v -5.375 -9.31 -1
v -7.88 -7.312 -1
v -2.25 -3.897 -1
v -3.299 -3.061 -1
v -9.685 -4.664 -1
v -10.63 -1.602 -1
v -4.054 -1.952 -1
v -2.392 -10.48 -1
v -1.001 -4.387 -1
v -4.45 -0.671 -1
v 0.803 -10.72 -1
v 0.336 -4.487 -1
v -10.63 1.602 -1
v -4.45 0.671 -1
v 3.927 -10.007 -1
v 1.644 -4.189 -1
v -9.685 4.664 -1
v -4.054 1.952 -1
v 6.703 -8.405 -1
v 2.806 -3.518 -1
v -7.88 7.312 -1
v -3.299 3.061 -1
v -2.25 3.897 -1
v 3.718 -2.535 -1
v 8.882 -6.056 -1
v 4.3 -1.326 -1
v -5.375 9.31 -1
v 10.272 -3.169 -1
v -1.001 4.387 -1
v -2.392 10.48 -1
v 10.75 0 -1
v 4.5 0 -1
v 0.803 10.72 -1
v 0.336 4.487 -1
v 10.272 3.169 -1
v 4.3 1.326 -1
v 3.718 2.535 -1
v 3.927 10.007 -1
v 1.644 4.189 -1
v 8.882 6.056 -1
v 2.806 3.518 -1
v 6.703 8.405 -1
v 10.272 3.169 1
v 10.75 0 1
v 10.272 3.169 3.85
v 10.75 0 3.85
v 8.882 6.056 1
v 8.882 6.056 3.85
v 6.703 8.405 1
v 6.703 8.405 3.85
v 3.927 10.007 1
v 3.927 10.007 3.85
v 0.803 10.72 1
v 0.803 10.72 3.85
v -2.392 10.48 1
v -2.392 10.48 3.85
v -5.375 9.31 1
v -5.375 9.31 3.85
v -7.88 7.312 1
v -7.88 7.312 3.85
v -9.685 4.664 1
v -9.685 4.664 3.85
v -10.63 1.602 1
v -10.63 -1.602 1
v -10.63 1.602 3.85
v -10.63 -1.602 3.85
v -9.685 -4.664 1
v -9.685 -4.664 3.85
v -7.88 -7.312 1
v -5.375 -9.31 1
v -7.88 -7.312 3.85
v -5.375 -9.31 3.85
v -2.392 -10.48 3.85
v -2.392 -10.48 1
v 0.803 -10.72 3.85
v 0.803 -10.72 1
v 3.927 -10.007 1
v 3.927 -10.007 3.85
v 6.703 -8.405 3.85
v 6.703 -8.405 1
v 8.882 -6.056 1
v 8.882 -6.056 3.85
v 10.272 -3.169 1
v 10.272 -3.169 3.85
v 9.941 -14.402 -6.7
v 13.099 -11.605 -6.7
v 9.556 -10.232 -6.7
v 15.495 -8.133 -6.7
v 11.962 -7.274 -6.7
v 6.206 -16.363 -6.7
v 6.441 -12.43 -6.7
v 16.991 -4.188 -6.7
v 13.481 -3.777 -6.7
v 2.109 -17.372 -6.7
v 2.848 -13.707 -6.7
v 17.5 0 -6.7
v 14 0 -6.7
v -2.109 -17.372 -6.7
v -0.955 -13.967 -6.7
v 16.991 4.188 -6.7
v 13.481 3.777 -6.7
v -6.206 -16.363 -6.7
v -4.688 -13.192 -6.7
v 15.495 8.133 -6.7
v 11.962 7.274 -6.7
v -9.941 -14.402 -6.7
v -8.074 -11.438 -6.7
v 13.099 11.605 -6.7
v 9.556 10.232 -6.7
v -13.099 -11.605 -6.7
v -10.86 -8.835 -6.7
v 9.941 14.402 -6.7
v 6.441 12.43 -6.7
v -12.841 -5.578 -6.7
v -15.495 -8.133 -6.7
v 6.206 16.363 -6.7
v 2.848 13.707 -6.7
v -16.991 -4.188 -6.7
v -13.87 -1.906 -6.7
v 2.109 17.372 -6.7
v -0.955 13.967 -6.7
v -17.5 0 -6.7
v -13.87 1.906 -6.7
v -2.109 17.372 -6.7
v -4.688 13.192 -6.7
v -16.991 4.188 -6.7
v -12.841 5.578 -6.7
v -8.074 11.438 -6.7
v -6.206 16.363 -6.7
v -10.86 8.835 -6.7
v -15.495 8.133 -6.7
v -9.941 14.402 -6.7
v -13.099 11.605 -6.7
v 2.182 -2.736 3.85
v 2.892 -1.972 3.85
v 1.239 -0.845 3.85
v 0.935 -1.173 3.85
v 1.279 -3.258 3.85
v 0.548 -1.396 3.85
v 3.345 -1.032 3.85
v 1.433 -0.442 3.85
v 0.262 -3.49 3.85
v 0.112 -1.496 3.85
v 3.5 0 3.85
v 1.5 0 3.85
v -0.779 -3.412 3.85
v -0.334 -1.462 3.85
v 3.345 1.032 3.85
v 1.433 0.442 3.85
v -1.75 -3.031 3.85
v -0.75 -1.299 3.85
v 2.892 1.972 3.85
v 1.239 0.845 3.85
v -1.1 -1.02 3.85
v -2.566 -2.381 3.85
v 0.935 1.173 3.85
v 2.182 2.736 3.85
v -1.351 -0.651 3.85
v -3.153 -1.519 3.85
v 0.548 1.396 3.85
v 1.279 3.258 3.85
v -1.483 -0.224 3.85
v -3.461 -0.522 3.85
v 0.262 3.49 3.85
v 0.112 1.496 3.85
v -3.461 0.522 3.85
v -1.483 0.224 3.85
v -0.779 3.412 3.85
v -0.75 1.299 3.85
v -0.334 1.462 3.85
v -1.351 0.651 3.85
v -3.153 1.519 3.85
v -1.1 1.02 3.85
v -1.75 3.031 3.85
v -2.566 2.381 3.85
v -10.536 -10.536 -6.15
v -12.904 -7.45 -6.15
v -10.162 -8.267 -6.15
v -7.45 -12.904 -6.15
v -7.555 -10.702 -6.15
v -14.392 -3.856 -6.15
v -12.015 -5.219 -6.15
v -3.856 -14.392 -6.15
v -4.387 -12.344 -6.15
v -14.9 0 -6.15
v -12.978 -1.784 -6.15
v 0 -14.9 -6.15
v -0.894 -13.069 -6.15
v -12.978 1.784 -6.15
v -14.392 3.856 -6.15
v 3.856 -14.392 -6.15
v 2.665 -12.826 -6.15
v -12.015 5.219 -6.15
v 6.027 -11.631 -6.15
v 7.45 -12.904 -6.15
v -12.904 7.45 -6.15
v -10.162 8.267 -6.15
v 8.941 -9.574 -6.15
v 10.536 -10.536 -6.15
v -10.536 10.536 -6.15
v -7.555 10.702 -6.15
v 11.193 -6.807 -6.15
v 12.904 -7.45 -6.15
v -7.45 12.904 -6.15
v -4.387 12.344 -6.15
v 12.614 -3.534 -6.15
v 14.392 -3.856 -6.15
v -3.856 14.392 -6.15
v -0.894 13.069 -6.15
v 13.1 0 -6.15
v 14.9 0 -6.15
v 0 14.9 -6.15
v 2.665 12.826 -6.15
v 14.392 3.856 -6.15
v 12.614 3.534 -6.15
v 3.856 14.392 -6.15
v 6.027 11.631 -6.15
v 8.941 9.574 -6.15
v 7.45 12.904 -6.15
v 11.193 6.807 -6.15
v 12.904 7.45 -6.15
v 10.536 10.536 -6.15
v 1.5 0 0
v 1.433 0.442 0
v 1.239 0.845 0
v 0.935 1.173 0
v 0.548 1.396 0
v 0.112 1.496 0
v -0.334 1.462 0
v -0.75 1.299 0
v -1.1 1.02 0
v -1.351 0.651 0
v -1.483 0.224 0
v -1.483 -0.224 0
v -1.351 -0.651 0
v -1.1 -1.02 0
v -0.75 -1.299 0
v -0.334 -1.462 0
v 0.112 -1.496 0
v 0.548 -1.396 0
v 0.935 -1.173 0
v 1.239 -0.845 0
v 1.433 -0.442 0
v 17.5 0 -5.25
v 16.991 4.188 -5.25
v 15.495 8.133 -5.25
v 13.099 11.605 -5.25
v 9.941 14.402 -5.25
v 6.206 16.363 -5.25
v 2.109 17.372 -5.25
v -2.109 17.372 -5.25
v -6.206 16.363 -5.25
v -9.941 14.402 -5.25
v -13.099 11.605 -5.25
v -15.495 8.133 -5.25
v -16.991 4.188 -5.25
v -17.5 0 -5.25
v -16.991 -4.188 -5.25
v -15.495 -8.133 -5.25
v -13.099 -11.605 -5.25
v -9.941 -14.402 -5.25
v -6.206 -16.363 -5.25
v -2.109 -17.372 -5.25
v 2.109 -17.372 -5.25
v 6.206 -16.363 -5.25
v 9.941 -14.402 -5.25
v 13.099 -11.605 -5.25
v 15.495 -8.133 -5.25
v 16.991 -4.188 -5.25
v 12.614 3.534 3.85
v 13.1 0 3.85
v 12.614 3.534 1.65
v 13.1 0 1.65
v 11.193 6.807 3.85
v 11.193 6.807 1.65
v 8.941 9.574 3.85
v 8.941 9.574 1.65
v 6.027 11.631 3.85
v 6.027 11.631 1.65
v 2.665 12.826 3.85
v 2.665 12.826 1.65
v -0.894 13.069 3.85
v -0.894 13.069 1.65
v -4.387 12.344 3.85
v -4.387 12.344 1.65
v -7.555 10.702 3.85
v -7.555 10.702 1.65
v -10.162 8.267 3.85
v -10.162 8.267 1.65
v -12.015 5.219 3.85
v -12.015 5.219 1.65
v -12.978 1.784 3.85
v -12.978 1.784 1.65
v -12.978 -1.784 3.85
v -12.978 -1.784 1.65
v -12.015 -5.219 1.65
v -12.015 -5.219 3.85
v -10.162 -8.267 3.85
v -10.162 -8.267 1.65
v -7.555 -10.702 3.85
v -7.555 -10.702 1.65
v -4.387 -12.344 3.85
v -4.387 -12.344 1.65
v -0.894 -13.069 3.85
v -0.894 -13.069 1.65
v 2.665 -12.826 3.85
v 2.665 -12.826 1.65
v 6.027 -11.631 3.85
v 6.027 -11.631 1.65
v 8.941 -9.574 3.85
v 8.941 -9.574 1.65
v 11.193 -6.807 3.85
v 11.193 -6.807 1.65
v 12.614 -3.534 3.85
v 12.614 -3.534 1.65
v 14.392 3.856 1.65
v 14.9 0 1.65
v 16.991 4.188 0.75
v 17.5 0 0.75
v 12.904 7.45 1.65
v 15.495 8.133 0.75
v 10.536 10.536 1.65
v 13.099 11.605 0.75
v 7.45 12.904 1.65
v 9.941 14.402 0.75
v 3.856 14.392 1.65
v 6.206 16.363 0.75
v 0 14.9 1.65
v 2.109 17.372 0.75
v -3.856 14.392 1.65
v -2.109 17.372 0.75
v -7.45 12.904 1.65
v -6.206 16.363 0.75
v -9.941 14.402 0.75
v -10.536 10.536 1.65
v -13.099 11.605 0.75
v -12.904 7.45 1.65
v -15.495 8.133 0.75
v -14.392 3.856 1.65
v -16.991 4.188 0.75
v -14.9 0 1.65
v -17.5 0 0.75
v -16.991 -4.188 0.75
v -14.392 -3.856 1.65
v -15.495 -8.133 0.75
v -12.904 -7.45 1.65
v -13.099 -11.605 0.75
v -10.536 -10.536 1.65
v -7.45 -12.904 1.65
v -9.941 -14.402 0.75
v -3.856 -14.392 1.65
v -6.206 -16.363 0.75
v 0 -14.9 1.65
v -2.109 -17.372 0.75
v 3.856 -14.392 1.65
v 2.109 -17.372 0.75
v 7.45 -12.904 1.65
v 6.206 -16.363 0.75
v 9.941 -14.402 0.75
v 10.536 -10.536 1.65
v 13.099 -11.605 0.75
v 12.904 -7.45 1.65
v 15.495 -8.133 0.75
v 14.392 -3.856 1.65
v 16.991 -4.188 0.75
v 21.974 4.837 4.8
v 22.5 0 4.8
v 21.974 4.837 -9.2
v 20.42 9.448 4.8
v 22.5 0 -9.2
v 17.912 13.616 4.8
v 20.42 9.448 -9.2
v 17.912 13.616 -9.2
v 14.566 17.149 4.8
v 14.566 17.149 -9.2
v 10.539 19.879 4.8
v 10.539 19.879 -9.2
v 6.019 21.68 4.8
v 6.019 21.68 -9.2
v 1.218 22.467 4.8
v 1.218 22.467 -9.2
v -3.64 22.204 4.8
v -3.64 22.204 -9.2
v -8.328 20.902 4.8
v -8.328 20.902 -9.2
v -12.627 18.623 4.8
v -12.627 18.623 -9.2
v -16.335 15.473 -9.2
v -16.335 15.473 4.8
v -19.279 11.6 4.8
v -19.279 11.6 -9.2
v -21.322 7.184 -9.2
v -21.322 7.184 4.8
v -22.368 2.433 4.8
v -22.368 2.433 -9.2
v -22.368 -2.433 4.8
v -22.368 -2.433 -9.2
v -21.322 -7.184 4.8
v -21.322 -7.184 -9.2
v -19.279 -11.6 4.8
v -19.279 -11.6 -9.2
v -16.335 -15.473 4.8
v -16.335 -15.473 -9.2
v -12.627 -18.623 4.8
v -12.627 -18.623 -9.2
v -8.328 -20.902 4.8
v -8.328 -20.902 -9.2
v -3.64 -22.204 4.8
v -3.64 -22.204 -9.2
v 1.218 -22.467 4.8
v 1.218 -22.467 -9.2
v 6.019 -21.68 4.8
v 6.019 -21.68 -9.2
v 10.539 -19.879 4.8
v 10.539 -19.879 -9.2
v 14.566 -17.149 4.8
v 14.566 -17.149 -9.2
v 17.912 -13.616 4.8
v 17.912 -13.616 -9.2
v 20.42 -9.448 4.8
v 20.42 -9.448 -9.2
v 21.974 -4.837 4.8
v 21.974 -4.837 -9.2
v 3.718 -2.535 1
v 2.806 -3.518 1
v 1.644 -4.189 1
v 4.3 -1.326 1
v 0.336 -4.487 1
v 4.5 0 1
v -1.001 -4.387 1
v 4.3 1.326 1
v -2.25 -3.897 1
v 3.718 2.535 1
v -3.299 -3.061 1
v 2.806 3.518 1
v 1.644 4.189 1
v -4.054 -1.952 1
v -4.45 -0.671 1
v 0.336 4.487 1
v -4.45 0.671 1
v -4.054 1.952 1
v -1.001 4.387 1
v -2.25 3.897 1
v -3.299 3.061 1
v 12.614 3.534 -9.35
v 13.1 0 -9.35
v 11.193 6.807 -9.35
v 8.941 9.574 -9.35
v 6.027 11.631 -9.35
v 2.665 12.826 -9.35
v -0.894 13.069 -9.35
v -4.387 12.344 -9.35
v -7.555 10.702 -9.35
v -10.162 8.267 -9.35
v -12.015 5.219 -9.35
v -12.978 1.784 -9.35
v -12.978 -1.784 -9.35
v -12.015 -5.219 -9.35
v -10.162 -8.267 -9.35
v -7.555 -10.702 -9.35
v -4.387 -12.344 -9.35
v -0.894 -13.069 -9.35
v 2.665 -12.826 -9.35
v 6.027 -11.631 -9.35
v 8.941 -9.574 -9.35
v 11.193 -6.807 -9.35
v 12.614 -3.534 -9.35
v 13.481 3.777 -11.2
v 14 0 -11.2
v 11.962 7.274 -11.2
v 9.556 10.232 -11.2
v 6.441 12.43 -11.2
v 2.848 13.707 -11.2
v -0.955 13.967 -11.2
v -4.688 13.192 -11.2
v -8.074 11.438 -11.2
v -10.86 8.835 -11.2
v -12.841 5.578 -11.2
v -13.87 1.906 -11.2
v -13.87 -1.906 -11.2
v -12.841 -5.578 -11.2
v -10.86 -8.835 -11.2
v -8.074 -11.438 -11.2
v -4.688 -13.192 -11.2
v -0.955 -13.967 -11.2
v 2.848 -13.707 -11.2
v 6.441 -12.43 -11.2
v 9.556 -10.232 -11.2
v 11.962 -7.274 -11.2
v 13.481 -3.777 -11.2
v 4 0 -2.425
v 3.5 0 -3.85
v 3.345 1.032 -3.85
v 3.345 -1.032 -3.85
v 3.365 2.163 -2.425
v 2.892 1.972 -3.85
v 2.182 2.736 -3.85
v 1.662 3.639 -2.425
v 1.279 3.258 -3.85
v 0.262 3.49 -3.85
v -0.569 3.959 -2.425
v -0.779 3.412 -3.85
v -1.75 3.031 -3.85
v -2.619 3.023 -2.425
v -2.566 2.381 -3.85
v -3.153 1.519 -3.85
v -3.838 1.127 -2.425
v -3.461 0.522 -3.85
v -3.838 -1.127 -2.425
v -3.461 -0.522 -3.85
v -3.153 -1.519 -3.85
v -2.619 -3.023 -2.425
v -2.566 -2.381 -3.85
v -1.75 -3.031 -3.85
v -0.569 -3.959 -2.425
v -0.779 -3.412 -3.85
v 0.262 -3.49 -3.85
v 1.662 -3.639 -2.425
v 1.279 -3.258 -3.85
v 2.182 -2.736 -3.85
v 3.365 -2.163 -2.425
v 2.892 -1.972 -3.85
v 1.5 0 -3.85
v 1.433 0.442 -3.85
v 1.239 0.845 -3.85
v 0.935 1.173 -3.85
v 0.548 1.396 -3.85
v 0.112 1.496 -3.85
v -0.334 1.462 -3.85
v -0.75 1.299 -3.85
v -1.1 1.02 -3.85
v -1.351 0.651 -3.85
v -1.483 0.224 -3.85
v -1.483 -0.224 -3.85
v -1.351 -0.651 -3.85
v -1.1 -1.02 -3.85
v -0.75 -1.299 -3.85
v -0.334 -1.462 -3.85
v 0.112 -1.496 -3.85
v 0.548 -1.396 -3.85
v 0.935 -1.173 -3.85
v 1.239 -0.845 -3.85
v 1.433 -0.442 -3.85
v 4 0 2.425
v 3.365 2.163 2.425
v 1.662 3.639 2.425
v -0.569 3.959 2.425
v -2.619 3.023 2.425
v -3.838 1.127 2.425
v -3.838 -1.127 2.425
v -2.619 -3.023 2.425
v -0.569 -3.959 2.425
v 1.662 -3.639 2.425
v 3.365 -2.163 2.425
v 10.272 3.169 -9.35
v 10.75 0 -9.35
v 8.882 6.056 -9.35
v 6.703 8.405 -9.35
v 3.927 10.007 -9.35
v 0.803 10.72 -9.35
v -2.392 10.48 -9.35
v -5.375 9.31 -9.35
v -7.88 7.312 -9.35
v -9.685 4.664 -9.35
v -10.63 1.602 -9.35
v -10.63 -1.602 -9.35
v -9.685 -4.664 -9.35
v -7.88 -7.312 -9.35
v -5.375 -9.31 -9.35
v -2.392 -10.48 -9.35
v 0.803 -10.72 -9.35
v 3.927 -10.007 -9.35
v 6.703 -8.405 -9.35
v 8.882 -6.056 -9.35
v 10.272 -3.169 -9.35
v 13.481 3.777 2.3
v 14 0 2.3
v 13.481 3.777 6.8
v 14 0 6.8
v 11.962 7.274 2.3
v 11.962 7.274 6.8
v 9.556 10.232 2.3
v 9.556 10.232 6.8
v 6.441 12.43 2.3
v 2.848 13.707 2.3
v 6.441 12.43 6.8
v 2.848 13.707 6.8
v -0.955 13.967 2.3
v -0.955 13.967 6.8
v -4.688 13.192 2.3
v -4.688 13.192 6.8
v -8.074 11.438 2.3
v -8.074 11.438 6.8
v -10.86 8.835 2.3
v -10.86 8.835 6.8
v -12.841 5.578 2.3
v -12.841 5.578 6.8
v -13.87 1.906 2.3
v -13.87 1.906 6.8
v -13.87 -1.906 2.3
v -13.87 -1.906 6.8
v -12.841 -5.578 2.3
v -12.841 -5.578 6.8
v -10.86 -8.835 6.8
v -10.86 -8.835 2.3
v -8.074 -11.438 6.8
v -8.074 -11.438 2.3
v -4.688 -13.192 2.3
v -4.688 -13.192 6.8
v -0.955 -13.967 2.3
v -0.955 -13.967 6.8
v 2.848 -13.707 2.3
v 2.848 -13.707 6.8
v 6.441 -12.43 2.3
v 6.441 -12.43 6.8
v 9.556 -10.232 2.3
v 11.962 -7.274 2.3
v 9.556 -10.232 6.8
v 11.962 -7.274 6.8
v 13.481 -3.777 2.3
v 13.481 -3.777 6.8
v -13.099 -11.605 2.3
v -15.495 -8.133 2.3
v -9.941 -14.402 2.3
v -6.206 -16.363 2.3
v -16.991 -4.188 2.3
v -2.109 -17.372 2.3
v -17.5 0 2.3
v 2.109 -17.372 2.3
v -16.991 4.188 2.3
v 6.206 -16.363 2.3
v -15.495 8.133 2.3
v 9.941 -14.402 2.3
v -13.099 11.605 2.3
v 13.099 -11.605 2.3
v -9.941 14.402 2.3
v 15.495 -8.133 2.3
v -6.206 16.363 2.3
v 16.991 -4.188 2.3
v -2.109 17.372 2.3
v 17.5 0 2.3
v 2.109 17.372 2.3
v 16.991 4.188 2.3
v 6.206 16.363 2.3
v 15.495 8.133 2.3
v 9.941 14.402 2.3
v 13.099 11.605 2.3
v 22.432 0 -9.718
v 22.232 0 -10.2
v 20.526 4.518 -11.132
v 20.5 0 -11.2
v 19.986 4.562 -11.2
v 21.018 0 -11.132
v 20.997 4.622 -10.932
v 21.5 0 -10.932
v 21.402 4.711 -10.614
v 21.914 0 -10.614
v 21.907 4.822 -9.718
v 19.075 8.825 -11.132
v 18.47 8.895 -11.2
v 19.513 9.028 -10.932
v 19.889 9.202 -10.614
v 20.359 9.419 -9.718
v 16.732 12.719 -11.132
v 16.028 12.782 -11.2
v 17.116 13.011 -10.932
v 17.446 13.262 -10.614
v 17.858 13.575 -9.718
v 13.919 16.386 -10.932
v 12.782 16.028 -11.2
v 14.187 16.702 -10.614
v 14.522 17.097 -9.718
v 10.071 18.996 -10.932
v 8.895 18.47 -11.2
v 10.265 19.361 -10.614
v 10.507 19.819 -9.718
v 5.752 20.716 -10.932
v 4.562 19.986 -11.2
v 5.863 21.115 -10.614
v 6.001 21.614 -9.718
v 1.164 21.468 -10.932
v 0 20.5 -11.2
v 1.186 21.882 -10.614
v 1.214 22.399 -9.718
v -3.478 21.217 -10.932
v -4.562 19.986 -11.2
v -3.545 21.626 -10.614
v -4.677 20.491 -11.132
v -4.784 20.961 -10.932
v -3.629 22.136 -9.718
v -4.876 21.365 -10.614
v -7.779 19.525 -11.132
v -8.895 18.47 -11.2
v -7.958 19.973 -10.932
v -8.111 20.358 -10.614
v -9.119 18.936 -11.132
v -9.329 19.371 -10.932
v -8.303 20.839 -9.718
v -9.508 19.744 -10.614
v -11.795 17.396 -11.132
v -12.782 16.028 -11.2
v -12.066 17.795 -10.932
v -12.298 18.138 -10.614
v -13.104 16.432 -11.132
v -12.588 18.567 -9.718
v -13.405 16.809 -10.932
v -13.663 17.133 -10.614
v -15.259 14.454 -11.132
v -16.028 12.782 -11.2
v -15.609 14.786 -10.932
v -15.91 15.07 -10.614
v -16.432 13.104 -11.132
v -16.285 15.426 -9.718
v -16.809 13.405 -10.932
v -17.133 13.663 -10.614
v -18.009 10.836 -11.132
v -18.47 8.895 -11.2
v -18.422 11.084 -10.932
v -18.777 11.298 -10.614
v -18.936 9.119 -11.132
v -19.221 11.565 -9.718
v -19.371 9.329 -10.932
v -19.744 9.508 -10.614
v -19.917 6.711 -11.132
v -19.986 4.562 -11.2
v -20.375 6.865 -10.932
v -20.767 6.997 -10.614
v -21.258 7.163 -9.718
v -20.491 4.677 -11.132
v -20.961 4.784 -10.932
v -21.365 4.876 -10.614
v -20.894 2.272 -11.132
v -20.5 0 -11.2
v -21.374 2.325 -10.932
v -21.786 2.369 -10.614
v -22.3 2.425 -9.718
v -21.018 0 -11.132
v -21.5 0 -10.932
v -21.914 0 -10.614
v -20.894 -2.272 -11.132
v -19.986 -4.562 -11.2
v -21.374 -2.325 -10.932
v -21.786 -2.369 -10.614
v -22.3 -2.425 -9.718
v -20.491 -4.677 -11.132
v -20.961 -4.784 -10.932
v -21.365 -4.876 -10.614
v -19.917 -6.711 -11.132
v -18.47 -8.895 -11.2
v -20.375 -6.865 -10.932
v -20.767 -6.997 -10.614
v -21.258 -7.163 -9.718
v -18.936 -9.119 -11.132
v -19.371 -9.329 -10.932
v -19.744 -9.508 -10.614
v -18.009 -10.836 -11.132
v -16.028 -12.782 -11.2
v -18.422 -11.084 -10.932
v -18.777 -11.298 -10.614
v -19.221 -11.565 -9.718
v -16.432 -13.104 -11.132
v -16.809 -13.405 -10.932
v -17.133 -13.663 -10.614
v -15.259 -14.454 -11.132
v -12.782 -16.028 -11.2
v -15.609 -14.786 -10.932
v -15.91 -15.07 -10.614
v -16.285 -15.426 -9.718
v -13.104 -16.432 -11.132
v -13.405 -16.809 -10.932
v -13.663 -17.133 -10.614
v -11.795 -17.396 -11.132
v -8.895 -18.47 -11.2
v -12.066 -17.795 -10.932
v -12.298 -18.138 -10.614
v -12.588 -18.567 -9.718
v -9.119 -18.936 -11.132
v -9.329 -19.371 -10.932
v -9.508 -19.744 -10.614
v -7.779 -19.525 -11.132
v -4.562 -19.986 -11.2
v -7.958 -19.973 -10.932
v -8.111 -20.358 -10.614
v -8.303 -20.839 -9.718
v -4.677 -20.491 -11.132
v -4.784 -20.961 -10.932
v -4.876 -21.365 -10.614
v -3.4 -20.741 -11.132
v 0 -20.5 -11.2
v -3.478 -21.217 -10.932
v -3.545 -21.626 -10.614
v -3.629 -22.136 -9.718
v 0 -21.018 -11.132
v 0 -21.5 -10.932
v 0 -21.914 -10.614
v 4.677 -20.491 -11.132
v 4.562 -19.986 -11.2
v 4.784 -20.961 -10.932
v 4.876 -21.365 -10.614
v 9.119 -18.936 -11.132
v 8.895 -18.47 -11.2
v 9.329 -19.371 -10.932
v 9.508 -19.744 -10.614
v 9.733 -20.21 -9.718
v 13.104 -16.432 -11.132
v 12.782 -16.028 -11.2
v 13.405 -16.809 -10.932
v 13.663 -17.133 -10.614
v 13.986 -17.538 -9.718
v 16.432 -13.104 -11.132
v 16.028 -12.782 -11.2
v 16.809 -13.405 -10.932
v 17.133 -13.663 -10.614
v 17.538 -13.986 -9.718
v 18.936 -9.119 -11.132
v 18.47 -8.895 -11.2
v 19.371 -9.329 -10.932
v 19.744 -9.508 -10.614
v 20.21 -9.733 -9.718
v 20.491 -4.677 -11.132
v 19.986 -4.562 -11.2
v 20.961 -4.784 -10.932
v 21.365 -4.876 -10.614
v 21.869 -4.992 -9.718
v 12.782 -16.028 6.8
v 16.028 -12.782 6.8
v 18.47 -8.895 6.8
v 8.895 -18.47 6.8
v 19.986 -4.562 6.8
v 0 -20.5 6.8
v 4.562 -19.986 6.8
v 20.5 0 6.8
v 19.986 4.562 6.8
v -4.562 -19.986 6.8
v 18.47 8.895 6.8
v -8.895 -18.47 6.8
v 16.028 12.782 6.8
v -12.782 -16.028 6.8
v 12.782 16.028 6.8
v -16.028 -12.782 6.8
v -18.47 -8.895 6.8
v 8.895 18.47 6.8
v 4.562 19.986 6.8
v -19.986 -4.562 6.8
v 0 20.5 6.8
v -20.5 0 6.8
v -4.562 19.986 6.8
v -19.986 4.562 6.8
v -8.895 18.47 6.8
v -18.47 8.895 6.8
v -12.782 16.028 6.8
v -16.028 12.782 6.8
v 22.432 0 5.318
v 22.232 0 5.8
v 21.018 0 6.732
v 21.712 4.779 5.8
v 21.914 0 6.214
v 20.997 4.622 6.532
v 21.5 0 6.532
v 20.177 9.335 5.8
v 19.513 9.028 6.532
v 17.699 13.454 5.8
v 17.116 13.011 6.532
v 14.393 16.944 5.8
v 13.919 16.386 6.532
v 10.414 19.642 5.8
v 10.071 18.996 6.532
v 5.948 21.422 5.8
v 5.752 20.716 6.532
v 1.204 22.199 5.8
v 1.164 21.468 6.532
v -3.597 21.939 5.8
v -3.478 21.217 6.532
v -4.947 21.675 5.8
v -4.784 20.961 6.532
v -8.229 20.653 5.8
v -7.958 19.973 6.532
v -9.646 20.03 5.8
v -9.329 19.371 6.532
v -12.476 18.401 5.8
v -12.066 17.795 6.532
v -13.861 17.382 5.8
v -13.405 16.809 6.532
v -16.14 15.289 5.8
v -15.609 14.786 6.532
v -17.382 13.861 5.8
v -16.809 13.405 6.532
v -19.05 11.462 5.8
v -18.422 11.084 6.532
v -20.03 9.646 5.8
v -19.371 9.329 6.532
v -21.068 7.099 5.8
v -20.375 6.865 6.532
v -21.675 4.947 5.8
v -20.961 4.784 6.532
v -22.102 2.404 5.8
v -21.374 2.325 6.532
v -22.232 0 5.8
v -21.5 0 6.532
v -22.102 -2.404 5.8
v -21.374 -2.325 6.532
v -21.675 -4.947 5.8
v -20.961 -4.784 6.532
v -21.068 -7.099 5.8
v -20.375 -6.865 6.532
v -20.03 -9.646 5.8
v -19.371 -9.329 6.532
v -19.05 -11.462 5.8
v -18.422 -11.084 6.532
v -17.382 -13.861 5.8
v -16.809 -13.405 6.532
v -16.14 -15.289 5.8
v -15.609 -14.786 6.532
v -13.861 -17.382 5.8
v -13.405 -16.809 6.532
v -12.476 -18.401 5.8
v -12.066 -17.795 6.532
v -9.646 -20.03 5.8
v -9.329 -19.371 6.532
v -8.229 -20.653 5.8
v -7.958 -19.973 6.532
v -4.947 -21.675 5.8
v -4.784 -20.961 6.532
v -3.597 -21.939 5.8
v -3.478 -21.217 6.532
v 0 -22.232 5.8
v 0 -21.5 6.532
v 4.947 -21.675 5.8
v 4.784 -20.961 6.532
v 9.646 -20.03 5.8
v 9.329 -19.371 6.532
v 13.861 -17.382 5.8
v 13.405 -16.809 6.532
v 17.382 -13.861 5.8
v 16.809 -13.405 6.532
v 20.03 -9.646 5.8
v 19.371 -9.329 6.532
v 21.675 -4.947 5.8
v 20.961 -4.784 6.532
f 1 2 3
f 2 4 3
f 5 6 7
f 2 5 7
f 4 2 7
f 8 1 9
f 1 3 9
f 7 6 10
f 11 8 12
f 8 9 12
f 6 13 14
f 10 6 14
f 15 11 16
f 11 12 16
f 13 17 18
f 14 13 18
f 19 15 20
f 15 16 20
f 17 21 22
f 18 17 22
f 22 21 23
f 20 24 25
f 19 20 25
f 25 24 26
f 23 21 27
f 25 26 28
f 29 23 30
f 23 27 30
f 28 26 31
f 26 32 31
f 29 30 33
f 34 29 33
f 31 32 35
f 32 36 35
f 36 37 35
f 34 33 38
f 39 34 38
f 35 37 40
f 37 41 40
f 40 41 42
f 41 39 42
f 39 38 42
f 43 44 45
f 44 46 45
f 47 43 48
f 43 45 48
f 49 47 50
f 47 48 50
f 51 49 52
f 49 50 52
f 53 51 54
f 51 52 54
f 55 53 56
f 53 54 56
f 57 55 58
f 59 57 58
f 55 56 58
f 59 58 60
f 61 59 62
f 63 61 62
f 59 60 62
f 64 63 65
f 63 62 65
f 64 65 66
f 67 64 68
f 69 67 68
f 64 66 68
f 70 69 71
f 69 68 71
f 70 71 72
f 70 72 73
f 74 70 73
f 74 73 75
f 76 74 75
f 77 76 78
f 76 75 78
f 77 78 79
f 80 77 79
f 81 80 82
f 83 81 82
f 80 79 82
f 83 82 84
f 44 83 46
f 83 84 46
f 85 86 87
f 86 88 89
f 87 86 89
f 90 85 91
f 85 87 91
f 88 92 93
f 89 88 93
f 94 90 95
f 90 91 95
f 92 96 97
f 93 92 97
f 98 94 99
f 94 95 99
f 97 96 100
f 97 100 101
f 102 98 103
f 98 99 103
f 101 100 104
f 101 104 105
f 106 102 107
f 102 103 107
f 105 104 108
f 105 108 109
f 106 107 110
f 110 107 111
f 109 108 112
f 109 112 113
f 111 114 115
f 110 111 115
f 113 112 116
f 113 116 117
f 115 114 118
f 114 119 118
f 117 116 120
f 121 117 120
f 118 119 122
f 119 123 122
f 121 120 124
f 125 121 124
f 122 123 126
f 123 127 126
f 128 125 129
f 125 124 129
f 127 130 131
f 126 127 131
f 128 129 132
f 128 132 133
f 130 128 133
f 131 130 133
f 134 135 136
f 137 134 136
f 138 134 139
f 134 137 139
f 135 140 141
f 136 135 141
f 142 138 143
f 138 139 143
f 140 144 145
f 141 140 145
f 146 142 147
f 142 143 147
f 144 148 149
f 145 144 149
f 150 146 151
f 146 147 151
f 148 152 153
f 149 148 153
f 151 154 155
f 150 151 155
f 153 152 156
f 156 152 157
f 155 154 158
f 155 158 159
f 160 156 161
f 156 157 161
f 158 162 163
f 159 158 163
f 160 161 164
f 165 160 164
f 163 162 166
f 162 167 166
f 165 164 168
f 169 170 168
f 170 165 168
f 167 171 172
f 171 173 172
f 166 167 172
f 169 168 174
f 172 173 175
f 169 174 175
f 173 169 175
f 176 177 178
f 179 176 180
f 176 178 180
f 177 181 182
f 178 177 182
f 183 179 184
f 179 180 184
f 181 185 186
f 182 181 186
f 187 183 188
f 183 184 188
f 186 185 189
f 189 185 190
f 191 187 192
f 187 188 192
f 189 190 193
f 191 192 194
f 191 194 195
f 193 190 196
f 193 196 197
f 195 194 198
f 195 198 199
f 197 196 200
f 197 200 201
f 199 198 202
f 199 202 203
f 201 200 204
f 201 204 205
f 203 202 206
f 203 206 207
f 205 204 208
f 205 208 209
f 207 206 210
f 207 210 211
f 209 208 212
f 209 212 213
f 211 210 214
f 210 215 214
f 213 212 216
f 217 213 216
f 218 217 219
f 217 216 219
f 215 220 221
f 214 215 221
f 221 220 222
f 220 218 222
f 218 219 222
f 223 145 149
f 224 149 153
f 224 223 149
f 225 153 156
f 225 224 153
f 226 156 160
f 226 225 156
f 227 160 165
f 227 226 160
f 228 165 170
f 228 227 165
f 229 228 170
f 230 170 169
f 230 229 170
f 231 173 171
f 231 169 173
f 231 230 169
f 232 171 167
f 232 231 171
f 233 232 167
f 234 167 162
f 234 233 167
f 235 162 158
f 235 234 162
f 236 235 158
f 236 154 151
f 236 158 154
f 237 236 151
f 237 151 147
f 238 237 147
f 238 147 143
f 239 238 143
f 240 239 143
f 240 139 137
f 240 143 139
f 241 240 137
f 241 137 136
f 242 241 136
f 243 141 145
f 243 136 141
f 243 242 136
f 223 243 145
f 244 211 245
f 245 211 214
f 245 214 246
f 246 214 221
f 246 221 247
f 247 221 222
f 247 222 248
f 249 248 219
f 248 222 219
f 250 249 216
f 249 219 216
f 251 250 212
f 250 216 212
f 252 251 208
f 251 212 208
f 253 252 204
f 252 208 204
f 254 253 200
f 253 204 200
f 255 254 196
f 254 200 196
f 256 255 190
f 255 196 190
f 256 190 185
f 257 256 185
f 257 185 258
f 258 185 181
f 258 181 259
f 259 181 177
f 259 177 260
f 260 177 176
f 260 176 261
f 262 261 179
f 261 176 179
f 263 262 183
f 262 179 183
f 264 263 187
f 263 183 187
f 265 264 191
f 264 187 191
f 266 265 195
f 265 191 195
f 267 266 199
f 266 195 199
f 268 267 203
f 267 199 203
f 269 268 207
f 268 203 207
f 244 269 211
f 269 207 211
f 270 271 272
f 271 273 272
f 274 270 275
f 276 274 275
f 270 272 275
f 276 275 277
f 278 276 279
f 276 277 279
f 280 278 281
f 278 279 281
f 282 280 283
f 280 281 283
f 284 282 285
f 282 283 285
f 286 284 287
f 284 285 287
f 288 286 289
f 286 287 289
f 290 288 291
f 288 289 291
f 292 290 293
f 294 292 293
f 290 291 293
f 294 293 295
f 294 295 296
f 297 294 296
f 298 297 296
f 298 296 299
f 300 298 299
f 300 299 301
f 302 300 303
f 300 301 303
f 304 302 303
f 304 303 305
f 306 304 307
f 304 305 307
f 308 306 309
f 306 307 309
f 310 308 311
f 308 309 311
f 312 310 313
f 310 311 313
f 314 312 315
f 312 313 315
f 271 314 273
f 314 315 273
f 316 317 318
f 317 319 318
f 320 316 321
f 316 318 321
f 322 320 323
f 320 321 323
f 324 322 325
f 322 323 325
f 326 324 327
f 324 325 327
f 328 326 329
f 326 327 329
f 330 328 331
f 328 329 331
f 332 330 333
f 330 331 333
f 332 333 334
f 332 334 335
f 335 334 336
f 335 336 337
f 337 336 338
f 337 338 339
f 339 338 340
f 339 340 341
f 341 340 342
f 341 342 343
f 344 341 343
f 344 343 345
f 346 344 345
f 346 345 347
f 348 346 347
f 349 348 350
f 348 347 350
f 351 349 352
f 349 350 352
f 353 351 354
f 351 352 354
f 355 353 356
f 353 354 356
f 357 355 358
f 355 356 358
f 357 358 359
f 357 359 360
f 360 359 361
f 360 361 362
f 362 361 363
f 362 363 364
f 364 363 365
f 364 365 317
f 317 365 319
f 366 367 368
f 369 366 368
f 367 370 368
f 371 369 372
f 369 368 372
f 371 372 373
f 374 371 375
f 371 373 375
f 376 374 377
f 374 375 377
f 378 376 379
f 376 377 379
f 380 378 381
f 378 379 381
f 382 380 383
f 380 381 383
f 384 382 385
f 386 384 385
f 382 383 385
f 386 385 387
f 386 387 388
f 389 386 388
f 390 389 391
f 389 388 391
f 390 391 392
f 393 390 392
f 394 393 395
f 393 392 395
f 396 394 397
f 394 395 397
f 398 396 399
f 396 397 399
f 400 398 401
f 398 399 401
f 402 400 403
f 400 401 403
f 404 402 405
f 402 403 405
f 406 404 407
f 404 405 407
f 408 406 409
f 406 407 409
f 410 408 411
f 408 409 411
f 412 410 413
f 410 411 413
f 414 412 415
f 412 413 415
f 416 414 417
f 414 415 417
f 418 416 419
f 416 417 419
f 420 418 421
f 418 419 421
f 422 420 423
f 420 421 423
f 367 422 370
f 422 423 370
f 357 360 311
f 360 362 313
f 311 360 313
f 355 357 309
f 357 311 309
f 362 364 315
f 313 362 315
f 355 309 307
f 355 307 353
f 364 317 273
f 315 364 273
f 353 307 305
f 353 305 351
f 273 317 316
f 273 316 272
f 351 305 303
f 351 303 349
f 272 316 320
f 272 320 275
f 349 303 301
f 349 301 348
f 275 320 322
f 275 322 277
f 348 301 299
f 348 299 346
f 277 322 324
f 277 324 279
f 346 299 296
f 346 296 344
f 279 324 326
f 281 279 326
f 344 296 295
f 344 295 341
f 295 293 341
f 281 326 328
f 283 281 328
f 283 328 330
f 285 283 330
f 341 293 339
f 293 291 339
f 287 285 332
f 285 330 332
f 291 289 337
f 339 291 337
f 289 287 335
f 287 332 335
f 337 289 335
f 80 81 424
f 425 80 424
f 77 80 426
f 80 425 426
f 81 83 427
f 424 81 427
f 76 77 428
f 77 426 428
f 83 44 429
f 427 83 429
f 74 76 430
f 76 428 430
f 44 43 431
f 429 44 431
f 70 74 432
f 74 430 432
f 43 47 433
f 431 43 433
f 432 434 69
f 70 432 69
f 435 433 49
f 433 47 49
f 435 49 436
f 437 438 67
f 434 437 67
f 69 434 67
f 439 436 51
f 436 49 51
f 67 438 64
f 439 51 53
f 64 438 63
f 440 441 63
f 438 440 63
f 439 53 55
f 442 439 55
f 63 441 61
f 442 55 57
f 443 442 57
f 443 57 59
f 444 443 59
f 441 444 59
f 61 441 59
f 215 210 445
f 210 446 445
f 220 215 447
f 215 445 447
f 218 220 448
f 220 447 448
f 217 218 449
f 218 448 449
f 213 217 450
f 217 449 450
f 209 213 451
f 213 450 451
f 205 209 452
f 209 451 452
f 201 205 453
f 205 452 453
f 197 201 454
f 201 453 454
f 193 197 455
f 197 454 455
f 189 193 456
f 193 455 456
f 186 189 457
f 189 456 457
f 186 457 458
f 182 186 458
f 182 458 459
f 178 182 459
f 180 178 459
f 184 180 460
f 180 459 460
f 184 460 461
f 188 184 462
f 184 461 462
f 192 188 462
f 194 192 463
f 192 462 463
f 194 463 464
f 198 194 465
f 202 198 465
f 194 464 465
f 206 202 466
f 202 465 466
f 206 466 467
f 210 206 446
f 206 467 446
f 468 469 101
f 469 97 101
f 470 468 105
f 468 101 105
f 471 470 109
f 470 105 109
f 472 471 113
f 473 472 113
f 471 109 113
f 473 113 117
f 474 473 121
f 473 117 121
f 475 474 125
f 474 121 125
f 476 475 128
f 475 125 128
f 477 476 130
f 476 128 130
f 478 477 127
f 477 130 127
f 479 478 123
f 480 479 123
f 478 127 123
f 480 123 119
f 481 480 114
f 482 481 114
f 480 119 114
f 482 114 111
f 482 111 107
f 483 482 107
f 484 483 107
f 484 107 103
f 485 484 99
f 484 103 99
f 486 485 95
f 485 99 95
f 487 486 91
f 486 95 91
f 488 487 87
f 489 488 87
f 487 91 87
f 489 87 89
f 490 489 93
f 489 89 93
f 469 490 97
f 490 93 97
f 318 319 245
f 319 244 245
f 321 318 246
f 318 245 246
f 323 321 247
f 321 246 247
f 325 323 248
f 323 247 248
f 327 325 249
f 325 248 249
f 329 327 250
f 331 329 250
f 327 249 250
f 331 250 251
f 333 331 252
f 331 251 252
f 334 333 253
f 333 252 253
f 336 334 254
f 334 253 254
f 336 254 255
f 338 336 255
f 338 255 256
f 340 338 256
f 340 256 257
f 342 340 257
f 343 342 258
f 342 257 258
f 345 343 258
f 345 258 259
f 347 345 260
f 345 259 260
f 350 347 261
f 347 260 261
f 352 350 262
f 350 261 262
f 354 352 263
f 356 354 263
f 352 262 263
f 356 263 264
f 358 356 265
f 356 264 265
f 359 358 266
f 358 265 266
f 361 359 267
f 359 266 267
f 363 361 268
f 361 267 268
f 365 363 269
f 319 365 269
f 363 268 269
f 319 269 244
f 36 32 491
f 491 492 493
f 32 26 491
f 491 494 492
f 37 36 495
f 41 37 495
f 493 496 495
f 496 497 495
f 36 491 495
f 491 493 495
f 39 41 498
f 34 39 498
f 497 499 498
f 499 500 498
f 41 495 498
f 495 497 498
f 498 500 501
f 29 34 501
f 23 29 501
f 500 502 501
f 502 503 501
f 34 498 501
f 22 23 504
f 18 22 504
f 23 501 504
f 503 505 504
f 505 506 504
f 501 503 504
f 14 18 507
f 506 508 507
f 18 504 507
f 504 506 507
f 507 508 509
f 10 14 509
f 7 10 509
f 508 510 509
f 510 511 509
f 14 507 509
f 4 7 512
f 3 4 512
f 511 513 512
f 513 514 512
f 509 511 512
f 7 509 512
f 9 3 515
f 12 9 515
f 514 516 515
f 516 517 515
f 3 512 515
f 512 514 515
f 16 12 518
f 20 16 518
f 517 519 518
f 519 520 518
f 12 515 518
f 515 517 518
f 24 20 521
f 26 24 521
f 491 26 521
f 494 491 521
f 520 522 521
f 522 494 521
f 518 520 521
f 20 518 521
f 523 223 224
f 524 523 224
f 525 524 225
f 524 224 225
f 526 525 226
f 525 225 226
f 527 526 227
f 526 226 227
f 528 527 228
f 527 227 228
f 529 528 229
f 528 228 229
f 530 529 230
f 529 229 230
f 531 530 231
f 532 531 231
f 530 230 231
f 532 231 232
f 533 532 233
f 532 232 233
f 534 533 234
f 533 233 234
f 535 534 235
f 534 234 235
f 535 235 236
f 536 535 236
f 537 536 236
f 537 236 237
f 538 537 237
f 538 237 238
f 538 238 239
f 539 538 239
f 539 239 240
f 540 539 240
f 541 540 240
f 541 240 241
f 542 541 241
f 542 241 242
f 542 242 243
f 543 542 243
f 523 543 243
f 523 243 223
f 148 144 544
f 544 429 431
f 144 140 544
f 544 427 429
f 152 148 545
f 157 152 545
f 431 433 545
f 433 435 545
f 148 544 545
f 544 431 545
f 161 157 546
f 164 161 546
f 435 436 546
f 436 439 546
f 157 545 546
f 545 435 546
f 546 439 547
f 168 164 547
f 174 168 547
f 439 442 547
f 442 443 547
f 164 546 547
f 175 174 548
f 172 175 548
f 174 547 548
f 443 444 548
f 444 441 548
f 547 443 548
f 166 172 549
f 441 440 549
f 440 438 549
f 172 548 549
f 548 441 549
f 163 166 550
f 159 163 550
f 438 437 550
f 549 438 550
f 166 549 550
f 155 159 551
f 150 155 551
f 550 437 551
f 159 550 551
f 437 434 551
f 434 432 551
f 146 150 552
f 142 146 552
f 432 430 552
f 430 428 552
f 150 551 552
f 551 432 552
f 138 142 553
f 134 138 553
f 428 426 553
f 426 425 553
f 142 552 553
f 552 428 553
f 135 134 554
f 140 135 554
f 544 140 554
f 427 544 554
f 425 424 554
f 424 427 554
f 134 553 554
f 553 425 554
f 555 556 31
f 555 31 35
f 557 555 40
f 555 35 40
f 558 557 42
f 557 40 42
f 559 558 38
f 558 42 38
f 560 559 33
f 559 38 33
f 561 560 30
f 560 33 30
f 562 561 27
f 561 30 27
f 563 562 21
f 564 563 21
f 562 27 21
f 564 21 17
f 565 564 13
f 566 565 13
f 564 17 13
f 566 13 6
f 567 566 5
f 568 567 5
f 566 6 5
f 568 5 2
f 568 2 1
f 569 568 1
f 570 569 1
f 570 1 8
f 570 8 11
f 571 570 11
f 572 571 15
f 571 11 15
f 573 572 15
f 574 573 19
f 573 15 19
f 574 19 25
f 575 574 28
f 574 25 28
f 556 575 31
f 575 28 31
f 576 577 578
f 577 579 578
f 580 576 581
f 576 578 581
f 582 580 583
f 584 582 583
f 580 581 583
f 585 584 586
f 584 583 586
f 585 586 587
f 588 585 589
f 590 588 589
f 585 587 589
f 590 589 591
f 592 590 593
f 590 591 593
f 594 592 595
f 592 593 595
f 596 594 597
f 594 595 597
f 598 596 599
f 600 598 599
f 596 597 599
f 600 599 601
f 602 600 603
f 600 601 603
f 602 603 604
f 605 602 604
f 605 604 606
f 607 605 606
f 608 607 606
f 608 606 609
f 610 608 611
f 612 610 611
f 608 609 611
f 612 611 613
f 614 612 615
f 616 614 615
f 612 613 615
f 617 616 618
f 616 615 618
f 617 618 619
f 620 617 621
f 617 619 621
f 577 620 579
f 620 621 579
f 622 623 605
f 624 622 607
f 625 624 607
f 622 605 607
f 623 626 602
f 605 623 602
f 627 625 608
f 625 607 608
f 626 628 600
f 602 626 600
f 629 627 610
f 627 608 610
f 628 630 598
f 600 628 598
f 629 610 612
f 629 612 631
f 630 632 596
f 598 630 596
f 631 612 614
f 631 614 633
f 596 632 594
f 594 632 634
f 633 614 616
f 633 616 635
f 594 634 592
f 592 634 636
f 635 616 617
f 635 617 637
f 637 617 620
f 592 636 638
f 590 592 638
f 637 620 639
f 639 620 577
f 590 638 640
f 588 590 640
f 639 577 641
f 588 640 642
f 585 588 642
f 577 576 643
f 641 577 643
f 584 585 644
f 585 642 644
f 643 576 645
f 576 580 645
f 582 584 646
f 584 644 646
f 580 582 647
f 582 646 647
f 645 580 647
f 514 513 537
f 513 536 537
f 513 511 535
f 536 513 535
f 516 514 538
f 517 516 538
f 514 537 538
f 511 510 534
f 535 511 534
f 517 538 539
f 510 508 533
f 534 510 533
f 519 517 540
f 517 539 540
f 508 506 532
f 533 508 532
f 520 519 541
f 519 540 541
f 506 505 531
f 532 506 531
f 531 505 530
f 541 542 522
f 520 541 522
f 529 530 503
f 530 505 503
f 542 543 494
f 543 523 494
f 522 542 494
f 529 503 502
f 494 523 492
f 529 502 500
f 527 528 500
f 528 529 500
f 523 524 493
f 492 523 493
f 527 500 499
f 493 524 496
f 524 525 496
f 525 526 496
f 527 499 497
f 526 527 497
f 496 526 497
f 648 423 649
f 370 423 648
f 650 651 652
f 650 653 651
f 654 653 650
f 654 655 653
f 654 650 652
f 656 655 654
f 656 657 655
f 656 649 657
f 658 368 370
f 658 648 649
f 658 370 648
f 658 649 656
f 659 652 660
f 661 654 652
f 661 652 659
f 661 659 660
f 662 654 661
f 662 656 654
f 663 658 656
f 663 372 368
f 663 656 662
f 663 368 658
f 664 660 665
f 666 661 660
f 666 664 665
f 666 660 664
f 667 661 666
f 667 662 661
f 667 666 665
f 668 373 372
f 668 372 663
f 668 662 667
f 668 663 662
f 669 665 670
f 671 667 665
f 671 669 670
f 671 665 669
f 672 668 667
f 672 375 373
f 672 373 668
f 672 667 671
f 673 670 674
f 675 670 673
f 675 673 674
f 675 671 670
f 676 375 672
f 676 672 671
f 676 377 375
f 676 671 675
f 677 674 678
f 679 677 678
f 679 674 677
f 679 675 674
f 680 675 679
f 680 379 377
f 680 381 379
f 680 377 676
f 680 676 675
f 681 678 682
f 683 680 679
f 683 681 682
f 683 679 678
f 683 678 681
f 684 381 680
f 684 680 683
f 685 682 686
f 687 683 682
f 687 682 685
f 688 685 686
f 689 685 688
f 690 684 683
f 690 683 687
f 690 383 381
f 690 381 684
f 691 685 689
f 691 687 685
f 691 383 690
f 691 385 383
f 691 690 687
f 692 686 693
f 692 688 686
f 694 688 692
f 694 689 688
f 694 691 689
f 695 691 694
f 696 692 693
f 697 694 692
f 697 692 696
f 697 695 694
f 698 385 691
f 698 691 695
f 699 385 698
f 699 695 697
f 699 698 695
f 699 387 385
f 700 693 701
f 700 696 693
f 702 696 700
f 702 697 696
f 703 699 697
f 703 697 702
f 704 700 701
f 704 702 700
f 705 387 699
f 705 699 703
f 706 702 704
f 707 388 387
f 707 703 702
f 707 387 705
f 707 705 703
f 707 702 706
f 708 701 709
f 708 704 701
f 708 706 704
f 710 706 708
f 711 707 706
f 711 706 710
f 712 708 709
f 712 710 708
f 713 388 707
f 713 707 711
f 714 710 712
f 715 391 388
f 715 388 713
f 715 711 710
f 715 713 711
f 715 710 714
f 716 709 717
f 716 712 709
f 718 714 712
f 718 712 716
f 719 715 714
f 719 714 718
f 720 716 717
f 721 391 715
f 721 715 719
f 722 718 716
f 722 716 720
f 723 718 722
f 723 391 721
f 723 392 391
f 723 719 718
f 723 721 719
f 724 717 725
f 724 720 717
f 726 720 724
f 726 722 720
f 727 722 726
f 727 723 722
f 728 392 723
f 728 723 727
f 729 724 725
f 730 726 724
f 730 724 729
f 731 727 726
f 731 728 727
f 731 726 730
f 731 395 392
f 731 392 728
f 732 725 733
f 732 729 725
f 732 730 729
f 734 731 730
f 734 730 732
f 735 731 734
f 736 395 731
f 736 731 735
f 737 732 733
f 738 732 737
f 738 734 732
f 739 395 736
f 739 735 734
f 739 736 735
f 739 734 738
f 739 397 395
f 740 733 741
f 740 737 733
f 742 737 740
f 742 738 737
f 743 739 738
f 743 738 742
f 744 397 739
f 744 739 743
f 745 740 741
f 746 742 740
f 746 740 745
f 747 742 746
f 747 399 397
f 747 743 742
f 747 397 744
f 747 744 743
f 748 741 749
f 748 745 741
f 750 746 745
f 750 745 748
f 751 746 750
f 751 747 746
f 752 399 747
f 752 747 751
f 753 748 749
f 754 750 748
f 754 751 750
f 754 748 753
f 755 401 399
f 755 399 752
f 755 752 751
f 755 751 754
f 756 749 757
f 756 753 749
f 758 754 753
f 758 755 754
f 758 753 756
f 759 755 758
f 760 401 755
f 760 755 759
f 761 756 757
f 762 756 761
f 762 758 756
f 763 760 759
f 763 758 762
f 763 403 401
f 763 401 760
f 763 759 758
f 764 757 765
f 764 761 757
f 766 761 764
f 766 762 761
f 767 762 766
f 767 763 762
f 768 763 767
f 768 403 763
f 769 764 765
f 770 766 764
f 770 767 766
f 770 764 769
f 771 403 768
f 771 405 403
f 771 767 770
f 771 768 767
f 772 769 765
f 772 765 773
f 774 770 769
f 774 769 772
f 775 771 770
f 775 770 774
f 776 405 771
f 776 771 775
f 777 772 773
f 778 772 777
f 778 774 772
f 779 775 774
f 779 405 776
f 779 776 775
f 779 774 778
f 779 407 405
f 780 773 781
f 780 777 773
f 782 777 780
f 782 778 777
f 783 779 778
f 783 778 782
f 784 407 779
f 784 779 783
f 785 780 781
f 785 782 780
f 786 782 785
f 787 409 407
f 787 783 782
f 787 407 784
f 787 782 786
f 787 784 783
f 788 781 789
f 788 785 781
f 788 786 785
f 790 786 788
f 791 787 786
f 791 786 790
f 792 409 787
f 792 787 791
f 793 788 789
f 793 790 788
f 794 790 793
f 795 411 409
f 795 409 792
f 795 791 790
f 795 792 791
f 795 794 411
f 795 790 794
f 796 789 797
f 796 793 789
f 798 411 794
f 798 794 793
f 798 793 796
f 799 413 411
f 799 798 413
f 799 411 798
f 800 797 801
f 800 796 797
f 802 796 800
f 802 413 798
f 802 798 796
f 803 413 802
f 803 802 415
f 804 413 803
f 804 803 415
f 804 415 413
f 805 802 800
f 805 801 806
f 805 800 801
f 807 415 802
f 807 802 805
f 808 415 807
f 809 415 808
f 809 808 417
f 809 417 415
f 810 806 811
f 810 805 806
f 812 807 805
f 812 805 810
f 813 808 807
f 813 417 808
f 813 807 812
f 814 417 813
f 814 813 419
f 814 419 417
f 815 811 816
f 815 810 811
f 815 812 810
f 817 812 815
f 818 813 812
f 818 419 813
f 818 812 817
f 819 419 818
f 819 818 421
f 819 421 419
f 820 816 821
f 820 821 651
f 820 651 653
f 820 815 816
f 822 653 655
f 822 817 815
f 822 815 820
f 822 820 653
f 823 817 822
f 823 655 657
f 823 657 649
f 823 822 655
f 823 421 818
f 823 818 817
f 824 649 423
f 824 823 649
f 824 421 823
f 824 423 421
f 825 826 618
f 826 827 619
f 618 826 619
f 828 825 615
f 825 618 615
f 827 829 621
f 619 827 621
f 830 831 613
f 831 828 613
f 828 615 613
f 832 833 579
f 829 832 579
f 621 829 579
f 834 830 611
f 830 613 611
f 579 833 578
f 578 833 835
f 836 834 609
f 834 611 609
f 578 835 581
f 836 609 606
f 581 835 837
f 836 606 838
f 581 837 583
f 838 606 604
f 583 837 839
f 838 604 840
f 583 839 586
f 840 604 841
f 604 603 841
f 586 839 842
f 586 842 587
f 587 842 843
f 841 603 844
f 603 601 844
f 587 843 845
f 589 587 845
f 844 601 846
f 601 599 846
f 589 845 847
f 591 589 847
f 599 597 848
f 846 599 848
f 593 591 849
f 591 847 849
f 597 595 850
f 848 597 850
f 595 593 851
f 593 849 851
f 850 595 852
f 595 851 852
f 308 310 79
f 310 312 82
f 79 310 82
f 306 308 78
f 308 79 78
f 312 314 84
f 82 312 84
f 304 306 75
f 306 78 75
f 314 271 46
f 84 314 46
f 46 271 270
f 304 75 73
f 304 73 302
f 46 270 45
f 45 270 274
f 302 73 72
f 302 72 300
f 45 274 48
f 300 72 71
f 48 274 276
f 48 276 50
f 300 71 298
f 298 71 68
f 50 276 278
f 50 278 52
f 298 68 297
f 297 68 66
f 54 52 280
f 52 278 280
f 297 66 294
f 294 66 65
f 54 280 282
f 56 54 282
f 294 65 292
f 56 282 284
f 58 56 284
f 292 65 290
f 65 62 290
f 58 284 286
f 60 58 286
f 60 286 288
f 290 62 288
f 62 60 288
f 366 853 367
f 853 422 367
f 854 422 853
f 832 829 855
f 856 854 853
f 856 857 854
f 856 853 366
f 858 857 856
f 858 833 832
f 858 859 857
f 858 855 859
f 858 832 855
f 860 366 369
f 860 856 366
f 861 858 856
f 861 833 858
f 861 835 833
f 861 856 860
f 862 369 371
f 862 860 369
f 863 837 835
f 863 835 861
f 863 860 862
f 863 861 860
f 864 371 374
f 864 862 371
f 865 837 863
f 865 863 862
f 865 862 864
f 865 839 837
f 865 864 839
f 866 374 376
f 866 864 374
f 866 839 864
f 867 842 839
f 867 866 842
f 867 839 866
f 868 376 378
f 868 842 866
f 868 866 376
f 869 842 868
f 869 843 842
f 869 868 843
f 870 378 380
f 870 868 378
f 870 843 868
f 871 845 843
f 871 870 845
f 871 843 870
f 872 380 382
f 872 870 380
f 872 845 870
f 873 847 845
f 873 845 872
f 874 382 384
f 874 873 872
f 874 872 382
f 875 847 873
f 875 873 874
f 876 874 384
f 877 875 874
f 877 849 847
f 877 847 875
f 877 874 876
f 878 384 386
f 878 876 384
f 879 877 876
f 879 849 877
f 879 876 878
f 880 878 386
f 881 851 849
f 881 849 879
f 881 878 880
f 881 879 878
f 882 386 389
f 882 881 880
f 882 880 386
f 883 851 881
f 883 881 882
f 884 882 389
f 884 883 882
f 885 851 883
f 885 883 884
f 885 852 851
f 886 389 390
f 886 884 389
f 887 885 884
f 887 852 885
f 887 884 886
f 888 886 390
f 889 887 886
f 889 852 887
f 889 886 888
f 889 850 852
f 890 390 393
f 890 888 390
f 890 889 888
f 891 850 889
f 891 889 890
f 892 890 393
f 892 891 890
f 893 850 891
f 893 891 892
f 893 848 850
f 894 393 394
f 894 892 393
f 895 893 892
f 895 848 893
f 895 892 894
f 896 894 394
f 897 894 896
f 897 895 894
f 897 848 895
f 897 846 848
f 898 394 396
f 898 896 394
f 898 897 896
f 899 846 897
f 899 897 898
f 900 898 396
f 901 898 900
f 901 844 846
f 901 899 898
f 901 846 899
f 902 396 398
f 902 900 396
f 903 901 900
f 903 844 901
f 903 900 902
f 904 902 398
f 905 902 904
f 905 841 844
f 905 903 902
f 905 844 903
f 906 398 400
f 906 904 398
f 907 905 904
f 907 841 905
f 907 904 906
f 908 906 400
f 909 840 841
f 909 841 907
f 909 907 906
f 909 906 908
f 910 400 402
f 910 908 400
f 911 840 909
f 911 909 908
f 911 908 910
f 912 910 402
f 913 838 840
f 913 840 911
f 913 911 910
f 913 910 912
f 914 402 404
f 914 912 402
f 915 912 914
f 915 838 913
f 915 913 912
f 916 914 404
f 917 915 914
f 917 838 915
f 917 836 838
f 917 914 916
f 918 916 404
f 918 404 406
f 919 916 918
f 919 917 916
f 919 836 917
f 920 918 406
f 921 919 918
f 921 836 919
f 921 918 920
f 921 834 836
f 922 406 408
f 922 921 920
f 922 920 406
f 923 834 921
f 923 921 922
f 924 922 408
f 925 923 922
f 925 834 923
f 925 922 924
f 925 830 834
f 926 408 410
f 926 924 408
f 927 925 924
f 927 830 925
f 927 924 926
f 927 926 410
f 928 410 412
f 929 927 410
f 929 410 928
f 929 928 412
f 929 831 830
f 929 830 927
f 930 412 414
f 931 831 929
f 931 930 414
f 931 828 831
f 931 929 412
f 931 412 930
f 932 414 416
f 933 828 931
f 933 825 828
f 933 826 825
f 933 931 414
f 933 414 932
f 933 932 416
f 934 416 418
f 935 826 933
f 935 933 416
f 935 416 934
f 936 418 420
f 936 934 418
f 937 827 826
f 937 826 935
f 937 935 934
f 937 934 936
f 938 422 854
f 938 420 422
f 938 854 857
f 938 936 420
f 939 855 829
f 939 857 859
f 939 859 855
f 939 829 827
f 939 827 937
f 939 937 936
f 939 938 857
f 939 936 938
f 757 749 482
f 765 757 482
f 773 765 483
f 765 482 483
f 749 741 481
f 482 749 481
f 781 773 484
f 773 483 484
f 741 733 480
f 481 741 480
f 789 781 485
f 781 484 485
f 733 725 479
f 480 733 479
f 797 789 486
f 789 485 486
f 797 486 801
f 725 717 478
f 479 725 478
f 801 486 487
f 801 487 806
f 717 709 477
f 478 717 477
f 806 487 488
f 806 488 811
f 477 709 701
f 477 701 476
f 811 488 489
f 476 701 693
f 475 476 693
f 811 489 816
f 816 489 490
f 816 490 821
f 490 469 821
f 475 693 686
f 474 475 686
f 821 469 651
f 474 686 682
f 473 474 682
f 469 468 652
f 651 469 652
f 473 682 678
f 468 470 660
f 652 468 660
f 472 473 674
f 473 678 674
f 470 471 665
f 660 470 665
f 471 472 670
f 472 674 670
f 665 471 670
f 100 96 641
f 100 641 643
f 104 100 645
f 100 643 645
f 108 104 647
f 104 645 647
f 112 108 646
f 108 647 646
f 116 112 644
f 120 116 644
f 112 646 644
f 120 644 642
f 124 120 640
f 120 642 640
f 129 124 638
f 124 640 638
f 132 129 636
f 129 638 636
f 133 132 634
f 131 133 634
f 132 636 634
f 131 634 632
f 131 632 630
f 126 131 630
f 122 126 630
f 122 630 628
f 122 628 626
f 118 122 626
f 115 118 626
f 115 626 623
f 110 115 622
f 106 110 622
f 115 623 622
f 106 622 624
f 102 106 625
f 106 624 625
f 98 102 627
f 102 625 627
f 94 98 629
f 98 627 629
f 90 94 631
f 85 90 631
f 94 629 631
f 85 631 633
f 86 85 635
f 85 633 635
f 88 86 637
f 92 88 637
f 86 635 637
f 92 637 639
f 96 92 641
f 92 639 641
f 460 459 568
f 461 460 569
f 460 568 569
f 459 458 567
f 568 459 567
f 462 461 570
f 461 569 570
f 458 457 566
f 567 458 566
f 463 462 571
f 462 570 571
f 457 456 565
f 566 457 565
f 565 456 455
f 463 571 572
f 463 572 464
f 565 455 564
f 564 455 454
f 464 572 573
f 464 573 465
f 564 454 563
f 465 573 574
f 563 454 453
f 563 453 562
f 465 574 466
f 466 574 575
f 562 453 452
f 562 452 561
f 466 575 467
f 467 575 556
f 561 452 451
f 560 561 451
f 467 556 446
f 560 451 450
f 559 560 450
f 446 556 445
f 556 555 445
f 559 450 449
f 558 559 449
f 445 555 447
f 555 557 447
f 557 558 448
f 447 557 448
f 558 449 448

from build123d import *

# Parameters (mm, degrees)
SKETCH001_R       = 1.5
POCKET_DEPTH      = 9.351
POCKET_DEPTH_BACK = -3.851


with BuildPart() as hub:
    # Sketch → Revolution (revolve)
    with BuildSketch(Plane.XZ):
        Polygon((0, -3.85), (0, 3.85), (3.5, 3.85), (4.5, 1), (10.75, 1), (10.75, 3.85), (13.1, 3.85), (13.1, 1.65), (14.9, 1.65), (17.5, 0.75), (17.5, -5.25), (14.9, -6.15), (13.1, -6.15), (13.1, -9.35), (10.75, -9.35), (10.75, -1), (4.5, -1), (3.5, -3.85), align=None)
    revolve(axis=Axis((0, 0, 0), (0, 0, 1)))

    # Sketch001 → Pocket (cut, two sides)
    with BuildSketch(Plane.XY) as pocket_sk:
        Circle(SKETCH001_R)
    extrude(amount=-POCKET_DEPTH, mode=Mode.SUBTRACT)
    extrude(pocket_sk.sketch, amount=-POCKET_DEPTH_BACK, mode=Mode.SUBTRACT)


with BuildPart() as tire:
    # Sketch002 → Revolution001 (revolve)
    with BuildSketch(Plane.XZ):
        with BuildLine():
            Line((14, 6.8), (20.5, 6.8))
            ThreePointArc((22.5, 4.8), (21.914214, 6.214214), (20.5, 6.8))
            Line((22.5, 4.8), (22.5, -9.2))
            ThreePointArc((20.5, -11.2), (21.914214, -10.614214), (22.5, -9.2))
            Line((20.5, -11.2), (14, -11.2))
            Line((14, -11.2), (14, -6.7))
            Line((14, -6.7), (17.5, -6.7))
            Line((17.5, -6.7), (17.5, 2.3))
            Line((17.5, 2.3), (14, 2.3))
            Line((14, 2.3), (14, 6.8))
        make_face()
    revolve(axis=Axis((0, 0, 0), (0, 0, 1)))


solid = Compound([hub.part, tire.part])
